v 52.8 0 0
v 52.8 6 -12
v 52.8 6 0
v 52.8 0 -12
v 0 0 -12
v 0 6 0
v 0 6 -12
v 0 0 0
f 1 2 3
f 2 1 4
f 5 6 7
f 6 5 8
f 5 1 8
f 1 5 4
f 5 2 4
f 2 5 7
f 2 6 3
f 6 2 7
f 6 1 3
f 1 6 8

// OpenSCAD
// file: params.scad
/*
 * Copyright (c) 2012 Haydn Vestal
 * 
 * See the file license.txt for copying permission.
 * 
 */

// GLOBAL
hole_radius = 5;
peg_radius = 4.5;

// MAGNET
mag_height = 6.4;
mag_ring_ir = 50;
mag_ring_or = 102;
mag_count = 16;

// BEARING
bearing_height = 25;
bearing_ir = 31;
bearing_or = 43;

// STATOR
stator_height = 16;
stator_inner_height = stator_height/2;
stator_count = 6;
stator_incidence = 360/stator_count;
stator_radius = 115;
stator_tab_width = 10;
stator_tab_offset = 50;
stator_wiring_gap = 25;
stator_wiring_gap_inset = stator_radius - (stator_wiring_gap + 10);
stator_outer_tab_extrude = 15;
stator_outer_tab_width = 30;
stator_notch = 15;
stator_notch_width = 5;
coil_edge = 80;
coil_block_length = 70;

// ROTOR & ROTOR CAP
rotor_height = mag_height + 2;
rotor_inner_height = 3;
rotor_radius = 105;
rotor_inner_radius = 20;
rotor_count = 8;
rotor_incidence = 360/rotor_count;
rotor_tie_hole_offset = 30;

rotor_cap_radius = 50;
rotor_cap_peg_radius = 35;
rotor_cap_inner_radius = 10;
rotor_cap_height = 10;
rotor_cap_insert_height = 10;
rotor_cap_bearing_inset = (bearing_height + rotor_inner_height) - rotor_cap_height;
rotor_plate_height = 5;
blade_holder_edge = 20;
rotor_peg_width = 12;
rotor_peg_height = (rotor_height * 2) + (rotor_cap_height * 2) + stator_height;

// ROTOR EDGE TIE
rotor_edge_tie_length = 40;
rotor_edge_tie_width = 20;
rotor_edge_tie_inner_height = 5;
rotor_edge_tie_height = rotor_height + rotor_plate_height;
rotor_edge_tie_peg_inset = 10;
// main file
/*
 * Copyright (c) 2012 Haydn Vestal
 * 
 * See the file license.txt for copying permission.
 *
 */

include <params.scad>


module rotor_peg_unadjusted() {
  cube([rotor_peg_width, (bearing_ir - rotor_inner_radius) - 5, rotor_peg_height]);
}

module rotor_peg() {
  rotate([0, 90, 0])
  rotor_peg_unadjusted();
}

rotor_peg();
